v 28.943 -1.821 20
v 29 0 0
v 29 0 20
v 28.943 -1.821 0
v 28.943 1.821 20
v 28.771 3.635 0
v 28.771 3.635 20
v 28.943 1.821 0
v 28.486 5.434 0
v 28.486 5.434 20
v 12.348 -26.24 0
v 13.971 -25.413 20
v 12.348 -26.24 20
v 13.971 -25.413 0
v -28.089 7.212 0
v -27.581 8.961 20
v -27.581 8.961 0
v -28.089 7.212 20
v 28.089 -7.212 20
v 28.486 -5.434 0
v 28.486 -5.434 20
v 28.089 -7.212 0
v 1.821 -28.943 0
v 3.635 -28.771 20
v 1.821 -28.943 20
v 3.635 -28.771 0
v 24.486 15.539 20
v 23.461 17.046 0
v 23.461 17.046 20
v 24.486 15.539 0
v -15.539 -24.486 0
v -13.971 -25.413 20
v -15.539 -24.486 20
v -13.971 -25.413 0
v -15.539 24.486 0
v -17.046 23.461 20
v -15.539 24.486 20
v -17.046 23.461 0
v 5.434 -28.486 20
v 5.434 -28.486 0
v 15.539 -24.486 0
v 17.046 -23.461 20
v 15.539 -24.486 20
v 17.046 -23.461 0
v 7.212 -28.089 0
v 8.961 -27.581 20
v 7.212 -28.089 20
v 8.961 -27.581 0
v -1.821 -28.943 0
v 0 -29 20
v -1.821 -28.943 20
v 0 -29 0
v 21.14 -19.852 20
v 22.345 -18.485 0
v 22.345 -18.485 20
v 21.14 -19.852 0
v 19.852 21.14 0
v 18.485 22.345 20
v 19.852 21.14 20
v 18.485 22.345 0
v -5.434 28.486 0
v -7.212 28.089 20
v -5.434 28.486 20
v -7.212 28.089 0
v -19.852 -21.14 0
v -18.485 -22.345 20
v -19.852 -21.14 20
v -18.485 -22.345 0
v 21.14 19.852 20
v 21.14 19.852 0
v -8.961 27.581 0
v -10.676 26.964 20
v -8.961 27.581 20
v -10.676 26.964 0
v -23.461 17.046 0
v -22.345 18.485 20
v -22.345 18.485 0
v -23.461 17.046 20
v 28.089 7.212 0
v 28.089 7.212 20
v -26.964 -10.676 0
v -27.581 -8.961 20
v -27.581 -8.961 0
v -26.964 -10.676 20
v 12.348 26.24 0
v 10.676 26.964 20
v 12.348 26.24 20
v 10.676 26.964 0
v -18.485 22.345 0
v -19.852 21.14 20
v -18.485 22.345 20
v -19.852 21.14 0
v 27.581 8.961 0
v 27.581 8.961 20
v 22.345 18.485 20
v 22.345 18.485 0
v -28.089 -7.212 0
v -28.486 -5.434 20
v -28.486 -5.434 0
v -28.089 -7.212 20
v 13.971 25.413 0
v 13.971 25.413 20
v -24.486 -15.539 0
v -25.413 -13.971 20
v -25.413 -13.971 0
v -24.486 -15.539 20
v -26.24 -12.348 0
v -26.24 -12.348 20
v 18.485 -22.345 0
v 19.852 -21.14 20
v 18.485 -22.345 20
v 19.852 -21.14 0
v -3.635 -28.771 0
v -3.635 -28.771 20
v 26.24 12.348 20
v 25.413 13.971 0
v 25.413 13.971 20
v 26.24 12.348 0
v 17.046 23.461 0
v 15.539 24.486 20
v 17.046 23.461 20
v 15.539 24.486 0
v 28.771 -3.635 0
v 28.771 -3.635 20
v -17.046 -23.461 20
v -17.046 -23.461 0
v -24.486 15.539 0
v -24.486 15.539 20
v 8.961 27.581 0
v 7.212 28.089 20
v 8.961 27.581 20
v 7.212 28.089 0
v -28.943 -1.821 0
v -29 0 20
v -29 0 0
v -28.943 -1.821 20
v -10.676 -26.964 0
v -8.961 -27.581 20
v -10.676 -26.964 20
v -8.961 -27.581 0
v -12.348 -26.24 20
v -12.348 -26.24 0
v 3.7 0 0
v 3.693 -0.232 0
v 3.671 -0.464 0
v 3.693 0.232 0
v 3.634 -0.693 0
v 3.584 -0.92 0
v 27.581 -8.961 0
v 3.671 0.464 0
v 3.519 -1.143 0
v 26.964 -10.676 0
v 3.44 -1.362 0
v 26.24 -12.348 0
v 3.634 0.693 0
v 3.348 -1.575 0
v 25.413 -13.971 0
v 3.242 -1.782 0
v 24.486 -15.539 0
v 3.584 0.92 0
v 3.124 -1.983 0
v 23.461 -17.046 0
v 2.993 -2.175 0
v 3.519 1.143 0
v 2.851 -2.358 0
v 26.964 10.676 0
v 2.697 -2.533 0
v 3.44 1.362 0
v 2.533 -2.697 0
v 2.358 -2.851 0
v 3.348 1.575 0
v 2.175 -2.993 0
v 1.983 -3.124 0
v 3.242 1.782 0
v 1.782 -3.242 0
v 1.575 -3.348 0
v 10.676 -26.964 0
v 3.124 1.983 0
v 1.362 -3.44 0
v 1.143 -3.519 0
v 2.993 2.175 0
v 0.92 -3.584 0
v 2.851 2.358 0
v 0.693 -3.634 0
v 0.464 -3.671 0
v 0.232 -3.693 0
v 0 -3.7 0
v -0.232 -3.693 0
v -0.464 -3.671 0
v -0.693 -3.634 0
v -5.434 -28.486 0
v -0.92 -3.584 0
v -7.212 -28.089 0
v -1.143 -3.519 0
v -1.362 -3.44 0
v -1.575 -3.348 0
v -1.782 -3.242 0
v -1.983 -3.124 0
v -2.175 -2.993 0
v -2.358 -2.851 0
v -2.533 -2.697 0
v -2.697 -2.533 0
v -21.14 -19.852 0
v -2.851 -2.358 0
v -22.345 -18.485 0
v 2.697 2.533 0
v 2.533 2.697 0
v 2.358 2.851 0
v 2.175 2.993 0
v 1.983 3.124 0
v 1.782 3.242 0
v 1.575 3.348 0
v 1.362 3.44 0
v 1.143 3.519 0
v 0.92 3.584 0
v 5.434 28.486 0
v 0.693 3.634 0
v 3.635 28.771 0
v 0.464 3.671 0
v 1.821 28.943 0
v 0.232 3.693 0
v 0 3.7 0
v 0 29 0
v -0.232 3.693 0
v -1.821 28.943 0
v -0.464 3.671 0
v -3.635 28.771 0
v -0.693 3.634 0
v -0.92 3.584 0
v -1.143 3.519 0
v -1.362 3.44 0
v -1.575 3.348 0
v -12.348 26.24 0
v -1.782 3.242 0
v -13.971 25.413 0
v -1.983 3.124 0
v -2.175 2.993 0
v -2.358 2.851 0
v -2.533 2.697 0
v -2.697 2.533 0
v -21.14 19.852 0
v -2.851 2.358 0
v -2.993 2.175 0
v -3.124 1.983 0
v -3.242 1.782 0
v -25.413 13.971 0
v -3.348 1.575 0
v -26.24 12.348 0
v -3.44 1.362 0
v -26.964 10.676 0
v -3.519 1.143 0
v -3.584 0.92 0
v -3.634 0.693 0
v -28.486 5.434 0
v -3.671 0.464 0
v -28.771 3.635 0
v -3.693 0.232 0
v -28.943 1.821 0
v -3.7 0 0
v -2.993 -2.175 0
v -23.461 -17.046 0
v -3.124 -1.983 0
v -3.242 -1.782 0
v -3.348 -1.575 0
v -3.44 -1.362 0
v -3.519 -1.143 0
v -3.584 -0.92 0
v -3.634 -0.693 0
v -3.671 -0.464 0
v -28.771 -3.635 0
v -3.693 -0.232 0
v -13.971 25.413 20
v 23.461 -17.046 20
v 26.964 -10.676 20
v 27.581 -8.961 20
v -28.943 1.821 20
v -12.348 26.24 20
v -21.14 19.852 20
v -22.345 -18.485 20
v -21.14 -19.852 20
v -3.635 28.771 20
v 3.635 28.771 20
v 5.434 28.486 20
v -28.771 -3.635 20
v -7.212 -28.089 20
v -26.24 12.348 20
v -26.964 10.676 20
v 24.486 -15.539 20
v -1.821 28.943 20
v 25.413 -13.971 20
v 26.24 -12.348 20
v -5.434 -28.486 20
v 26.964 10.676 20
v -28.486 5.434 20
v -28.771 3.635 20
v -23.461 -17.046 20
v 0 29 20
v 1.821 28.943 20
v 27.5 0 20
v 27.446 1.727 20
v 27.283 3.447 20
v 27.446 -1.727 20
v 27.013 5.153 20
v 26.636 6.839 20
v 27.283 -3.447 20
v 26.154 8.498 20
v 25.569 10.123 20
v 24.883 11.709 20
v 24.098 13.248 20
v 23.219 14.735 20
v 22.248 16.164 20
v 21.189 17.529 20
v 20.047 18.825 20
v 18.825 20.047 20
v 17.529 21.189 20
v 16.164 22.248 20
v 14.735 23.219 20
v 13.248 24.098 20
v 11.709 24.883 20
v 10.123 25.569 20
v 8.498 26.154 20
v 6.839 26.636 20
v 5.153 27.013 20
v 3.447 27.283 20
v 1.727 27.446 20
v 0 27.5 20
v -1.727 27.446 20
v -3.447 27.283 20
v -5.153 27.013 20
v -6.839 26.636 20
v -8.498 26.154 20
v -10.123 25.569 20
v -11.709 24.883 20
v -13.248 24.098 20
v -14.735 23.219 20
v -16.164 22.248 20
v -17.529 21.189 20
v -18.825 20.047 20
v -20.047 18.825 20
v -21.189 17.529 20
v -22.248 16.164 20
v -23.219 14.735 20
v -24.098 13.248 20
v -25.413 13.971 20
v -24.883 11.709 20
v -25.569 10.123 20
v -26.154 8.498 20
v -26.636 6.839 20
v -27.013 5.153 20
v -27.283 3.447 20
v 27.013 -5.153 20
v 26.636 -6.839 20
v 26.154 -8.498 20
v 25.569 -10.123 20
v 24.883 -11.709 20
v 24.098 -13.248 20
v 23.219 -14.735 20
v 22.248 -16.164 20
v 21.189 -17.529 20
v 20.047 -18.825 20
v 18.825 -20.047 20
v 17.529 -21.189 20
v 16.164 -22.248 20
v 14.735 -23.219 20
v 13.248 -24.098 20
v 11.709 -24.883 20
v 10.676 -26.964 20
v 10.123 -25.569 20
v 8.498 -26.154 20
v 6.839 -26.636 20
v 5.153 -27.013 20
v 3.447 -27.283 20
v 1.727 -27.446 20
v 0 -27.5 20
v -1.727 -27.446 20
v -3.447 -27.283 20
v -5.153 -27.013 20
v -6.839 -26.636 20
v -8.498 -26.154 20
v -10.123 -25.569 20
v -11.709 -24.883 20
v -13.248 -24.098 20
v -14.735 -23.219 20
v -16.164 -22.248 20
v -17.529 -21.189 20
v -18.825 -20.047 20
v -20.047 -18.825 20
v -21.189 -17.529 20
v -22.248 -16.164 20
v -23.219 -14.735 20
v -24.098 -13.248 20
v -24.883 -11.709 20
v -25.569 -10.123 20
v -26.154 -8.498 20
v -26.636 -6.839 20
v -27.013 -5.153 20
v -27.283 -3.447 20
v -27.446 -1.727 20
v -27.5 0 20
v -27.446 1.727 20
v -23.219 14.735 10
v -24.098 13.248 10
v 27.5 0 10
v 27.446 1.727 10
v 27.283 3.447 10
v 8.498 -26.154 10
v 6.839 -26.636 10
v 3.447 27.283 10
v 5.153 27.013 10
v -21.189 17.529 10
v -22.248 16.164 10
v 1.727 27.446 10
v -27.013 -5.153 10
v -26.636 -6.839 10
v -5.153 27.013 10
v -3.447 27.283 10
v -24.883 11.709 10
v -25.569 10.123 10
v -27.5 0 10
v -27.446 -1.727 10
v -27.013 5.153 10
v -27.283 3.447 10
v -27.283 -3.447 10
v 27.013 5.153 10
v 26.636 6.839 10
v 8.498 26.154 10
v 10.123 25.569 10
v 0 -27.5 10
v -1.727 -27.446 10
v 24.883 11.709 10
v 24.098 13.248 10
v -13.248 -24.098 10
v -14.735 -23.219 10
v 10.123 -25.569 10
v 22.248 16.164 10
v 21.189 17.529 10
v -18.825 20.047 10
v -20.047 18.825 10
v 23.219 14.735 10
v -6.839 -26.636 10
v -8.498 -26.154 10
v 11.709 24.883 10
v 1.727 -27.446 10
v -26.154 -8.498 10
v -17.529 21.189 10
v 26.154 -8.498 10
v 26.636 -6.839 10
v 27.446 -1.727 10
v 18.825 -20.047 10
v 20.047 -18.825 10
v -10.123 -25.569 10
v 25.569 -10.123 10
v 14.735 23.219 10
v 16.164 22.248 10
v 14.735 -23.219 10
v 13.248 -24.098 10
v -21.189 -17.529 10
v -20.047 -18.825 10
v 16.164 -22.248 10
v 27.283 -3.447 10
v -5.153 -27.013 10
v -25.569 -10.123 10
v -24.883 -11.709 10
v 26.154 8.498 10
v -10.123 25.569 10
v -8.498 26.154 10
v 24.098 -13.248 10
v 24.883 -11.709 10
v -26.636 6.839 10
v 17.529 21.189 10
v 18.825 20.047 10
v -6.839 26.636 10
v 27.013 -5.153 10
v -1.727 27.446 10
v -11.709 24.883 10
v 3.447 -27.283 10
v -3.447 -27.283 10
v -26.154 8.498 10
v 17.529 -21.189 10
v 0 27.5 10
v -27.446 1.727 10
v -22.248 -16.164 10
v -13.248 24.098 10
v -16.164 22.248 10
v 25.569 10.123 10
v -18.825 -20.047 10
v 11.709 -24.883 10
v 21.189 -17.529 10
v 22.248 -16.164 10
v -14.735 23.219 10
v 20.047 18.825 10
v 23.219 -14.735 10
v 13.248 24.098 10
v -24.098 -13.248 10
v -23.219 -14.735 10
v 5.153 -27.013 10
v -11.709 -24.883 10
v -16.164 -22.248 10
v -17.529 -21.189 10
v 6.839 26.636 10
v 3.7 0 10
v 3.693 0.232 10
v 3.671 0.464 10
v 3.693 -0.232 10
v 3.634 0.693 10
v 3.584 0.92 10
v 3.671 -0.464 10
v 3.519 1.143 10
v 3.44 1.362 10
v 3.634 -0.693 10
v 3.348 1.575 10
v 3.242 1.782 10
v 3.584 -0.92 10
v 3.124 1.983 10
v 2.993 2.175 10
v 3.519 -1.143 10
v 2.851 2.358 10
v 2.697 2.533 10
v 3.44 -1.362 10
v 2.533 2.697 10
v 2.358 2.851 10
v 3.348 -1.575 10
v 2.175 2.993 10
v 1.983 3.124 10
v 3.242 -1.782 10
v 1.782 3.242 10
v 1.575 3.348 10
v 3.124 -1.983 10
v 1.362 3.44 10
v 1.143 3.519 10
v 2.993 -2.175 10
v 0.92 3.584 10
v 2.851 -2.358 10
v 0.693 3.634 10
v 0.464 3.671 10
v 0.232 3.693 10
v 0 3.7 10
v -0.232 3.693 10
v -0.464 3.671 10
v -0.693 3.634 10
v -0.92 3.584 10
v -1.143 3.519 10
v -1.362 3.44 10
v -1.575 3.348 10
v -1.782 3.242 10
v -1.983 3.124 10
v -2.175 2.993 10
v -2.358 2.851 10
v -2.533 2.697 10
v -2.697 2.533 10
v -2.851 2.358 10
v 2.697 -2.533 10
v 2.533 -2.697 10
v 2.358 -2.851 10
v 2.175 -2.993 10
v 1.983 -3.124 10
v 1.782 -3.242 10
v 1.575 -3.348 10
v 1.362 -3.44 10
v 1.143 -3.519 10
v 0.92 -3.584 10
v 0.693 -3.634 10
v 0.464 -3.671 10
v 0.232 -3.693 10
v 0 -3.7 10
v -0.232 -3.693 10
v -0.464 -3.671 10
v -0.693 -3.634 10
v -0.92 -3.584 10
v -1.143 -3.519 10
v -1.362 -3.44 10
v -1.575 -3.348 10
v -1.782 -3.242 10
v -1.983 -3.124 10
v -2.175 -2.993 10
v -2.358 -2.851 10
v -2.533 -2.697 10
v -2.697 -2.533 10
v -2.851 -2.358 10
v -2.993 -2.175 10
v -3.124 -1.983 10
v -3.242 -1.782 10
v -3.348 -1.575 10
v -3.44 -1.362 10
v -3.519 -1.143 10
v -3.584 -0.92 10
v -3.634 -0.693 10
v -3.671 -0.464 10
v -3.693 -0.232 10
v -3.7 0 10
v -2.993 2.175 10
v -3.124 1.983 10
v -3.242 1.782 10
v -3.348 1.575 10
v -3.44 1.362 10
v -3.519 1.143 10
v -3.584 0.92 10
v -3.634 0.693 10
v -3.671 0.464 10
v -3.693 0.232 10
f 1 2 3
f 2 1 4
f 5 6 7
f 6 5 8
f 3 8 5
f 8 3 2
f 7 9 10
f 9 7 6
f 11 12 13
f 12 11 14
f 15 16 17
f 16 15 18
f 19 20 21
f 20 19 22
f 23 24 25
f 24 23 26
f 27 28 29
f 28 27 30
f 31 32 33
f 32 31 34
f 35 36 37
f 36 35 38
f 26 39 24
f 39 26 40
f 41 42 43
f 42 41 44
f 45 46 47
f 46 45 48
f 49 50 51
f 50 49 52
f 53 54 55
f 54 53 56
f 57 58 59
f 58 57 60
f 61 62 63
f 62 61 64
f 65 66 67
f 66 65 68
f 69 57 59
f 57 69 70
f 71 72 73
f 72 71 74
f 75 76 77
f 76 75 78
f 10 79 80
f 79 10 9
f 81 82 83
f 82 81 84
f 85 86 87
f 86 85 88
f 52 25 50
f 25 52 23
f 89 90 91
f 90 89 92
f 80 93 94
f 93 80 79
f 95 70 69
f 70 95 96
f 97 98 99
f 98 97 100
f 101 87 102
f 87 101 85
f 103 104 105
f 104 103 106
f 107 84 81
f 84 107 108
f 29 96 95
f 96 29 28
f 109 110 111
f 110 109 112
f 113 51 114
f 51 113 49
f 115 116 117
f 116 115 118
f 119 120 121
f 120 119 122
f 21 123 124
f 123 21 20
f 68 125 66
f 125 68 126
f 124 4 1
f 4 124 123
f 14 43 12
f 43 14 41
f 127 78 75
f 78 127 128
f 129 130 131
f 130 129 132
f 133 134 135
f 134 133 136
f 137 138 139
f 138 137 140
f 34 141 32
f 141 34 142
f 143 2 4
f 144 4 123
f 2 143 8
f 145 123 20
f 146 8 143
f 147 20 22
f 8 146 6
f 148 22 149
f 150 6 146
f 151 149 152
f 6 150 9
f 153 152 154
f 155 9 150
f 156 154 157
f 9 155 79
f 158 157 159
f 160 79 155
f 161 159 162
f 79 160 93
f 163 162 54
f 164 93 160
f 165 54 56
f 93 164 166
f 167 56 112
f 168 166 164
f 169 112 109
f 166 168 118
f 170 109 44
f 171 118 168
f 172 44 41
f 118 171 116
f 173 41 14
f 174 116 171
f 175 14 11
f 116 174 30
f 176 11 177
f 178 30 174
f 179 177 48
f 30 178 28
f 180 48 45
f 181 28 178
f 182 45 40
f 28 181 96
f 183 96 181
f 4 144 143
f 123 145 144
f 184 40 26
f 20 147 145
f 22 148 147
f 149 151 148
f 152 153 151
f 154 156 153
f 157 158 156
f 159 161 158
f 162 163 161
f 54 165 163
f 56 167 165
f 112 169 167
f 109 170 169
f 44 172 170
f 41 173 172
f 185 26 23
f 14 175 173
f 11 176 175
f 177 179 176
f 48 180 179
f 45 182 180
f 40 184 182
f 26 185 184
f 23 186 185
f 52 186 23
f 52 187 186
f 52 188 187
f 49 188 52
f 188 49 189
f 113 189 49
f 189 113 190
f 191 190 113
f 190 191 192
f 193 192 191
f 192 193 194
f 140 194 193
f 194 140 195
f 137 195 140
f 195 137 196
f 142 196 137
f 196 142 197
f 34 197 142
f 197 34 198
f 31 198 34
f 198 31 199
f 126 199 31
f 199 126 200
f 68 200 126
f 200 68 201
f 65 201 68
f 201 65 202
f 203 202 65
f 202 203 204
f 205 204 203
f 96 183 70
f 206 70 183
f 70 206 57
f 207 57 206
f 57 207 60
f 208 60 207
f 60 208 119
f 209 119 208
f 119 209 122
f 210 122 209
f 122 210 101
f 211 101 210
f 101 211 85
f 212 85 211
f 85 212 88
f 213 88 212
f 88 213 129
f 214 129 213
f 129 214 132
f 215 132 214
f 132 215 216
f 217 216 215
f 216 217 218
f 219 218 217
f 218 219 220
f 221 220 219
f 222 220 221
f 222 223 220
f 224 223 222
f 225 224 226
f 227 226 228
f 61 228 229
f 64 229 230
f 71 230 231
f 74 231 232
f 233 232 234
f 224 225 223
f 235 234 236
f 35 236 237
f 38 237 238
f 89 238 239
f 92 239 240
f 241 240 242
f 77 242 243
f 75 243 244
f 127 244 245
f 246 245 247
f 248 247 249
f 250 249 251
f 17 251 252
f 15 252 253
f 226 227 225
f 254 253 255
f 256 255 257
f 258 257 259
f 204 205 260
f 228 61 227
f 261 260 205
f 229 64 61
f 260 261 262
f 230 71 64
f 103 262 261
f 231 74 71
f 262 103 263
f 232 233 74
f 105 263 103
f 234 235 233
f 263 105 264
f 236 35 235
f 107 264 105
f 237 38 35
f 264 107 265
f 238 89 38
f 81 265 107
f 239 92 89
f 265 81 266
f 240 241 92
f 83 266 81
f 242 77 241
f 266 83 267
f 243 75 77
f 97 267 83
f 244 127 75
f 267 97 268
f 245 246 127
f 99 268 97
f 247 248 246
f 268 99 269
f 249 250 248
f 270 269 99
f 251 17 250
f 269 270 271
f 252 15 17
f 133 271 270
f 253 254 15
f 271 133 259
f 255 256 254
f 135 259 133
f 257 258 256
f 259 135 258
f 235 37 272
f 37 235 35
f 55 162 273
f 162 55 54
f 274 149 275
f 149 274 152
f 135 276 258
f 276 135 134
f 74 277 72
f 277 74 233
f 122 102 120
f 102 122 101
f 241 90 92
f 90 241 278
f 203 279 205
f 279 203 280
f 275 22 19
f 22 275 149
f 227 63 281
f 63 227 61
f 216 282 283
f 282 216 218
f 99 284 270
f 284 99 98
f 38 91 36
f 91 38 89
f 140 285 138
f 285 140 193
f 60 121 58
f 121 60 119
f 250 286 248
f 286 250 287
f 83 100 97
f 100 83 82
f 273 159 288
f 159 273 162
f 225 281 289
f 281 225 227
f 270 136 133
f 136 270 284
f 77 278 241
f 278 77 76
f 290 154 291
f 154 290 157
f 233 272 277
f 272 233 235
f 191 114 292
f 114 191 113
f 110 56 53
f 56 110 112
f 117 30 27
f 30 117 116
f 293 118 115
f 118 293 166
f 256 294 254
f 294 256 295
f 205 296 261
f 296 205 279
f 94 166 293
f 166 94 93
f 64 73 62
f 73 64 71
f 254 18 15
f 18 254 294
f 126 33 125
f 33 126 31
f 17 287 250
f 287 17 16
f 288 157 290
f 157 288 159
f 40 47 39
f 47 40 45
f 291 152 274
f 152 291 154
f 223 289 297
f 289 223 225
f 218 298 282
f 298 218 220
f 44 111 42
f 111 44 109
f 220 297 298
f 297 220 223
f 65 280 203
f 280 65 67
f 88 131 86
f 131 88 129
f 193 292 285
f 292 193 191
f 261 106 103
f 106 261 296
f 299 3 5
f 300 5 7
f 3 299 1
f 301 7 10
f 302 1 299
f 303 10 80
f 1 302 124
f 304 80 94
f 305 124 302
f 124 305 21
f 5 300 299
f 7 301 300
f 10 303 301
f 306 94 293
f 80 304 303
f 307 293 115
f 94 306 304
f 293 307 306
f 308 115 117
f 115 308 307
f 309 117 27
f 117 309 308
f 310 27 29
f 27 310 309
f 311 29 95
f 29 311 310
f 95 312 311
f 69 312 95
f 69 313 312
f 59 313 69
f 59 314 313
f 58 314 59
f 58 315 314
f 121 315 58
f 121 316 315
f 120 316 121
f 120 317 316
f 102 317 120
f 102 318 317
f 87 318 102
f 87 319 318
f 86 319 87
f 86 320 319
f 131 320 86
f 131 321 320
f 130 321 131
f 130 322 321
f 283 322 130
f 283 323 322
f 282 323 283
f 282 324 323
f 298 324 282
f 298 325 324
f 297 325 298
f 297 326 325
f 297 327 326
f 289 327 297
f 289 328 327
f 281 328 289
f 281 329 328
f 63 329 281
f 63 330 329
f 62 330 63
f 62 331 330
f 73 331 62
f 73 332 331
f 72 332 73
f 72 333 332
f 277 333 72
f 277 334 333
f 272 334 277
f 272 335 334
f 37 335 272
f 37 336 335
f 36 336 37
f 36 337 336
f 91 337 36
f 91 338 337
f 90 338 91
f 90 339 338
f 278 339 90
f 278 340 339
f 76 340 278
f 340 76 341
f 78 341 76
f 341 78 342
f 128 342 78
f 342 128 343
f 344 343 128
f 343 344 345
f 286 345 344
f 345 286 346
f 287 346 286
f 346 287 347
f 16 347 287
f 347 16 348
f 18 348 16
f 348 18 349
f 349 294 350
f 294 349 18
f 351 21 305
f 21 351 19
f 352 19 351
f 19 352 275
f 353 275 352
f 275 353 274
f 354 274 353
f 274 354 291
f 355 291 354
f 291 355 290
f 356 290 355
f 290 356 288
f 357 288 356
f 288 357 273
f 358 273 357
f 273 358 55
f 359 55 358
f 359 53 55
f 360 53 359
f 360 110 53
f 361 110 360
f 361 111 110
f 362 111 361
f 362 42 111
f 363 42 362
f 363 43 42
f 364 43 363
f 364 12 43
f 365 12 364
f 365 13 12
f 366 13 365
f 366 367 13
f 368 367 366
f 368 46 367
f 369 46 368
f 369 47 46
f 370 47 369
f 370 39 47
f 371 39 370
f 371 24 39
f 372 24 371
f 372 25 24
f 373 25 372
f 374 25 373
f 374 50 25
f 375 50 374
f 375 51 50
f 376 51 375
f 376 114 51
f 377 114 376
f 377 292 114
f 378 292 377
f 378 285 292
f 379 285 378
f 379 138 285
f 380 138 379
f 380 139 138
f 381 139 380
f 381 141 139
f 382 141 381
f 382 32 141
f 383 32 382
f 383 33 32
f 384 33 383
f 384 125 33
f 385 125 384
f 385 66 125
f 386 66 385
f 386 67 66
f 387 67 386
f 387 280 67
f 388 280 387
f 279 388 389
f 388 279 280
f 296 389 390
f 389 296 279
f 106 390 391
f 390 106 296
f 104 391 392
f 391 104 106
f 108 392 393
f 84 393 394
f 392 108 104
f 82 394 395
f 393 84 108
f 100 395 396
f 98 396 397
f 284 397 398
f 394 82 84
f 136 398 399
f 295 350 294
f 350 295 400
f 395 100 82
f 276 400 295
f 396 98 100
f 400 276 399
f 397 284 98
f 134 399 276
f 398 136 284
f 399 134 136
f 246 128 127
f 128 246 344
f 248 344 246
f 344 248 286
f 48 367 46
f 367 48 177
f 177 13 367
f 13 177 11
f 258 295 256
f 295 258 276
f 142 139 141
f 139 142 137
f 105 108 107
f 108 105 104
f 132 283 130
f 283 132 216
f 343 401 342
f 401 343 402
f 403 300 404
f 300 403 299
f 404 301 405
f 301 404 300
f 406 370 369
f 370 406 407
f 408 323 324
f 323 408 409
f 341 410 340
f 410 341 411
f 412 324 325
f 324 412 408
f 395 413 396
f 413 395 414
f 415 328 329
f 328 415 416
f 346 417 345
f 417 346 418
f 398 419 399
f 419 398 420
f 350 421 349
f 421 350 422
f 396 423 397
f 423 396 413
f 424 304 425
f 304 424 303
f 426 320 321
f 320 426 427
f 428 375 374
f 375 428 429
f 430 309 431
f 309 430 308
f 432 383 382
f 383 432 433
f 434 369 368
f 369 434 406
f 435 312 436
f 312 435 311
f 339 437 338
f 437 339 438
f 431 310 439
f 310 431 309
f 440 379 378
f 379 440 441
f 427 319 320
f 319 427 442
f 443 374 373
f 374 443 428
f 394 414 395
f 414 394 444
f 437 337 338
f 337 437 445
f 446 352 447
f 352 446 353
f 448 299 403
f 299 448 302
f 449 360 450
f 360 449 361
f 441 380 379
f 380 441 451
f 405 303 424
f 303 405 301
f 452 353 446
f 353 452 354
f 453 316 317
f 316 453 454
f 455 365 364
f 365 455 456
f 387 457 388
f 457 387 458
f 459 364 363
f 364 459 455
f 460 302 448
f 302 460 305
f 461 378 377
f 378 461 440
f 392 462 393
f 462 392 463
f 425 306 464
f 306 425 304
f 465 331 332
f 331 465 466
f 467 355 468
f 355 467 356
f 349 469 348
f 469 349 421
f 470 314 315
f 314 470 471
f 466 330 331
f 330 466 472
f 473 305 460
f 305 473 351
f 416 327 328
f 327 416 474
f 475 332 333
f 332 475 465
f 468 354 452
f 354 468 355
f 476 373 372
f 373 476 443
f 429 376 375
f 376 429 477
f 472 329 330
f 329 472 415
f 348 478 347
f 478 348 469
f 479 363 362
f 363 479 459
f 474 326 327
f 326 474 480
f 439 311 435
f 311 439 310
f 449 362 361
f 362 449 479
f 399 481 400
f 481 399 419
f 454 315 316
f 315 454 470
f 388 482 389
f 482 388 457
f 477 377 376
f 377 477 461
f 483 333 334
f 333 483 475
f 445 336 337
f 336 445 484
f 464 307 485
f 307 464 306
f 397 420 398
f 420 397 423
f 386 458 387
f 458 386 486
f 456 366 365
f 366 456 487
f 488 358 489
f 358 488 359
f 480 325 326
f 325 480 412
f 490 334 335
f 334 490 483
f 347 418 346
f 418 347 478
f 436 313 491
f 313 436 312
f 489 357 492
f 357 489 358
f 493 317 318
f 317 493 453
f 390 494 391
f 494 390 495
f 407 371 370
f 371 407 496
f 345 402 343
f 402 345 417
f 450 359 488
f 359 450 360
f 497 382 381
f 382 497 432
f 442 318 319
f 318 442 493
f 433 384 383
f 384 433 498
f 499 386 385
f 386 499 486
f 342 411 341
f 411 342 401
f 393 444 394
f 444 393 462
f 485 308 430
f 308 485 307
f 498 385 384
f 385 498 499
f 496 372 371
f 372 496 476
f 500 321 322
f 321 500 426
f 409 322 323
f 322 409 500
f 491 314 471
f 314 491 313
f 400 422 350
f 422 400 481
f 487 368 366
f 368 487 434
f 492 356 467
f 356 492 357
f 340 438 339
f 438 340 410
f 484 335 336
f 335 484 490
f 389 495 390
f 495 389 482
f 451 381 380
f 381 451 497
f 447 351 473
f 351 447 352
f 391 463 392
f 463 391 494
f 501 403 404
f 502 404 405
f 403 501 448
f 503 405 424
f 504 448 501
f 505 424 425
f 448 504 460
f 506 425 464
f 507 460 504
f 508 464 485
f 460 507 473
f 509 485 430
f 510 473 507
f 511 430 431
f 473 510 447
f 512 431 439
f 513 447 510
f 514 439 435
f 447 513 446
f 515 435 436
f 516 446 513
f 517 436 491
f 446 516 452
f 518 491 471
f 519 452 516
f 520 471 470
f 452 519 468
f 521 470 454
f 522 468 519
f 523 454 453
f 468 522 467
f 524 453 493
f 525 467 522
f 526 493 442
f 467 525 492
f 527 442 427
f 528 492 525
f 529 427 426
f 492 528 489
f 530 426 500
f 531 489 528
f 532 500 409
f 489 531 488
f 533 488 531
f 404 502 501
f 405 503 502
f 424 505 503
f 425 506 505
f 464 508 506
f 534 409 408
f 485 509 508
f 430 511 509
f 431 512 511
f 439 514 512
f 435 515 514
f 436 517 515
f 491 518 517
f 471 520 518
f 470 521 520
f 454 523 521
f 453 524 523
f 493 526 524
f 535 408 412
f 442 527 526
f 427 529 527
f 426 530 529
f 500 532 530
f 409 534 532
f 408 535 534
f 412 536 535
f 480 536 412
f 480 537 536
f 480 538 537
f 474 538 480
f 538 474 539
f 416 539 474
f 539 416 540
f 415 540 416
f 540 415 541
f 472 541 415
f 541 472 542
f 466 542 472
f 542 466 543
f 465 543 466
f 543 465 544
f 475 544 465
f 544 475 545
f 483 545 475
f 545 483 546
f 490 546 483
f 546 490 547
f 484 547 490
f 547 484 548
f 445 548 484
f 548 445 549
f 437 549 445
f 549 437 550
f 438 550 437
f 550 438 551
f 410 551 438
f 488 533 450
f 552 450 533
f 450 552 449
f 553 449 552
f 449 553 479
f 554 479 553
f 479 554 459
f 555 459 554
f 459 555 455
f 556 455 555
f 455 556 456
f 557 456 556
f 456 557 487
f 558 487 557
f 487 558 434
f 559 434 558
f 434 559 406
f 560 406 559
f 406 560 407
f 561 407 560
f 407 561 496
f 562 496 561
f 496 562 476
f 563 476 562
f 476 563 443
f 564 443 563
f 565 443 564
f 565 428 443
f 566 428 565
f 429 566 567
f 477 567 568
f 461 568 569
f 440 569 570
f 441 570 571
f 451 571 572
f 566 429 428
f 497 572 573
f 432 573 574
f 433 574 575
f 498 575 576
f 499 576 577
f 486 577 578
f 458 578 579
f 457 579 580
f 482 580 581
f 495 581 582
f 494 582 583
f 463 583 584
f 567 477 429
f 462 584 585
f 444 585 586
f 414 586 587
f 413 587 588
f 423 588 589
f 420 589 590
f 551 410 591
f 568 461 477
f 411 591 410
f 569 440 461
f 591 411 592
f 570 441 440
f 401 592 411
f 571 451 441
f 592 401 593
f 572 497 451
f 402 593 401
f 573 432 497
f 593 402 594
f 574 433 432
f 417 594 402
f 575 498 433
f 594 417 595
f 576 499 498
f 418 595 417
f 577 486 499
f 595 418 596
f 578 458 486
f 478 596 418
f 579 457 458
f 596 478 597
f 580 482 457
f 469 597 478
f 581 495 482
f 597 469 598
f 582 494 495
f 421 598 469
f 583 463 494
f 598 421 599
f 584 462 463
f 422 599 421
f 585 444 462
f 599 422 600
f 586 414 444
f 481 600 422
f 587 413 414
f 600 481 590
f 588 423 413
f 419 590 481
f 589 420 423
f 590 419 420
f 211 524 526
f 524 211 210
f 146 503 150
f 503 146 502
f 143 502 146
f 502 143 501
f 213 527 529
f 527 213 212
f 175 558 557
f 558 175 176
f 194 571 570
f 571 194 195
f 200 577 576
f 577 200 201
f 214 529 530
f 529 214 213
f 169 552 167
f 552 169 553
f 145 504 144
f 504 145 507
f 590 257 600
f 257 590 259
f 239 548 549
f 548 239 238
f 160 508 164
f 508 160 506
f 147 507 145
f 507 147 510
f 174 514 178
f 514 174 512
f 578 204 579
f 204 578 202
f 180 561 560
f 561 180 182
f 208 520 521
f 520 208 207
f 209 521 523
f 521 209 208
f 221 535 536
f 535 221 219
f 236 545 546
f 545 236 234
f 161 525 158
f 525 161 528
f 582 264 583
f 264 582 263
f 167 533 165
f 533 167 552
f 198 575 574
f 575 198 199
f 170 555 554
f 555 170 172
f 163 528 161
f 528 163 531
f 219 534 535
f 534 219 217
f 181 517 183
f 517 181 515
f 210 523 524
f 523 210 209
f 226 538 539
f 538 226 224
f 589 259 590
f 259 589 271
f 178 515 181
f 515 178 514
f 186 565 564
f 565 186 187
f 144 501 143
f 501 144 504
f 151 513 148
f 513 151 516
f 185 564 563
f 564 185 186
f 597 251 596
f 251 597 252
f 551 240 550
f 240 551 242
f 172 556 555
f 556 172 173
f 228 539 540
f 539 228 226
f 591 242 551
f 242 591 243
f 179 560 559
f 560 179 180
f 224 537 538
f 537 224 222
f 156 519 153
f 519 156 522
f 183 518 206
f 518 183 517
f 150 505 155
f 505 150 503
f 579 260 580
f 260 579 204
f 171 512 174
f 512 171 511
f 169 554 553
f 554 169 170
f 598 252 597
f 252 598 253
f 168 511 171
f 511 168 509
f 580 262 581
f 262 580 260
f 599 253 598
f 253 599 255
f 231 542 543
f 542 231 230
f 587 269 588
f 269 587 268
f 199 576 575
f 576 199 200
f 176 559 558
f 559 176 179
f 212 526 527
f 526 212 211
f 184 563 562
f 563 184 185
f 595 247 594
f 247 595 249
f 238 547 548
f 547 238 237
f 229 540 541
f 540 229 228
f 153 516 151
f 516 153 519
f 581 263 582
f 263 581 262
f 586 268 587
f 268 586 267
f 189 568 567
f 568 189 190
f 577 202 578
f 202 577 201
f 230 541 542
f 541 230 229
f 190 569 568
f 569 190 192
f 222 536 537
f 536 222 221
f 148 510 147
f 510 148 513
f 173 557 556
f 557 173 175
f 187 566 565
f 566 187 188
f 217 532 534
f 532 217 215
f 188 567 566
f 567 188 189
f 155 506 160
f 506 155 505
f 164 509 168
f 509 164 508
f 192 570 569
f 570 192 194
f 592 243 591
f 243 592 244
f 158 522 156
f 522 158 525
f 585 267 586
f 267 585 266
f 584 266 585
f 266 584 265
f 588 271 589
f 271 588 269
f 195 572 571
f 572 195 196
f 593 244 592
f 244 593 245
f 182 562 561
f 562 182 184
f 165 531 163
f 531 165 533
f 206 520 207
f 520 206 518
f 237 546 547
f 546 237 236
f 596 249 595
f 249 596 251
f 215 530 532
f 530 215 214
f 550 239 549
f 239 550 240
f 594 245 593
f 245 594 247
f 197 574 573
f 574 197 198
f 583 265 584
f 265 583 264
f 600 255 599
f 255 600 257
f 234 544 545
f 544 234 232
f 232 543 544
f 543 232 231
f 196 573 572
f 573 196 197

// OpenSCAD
// 3 cylinders 
// center rod 7mm
// ouside: 55mm
$fn=100;
SMALL_DIAM = 7.4;
LARGE_DIAM = 55;

HEIGHT_1 = 10;
HEIGHT_2 = HEIGHT_1 + 10;

difference(){
    cylinder(h=HEIGHT_2,d=LARGE_DIAM+3);
    cylinder(h=HEIGHT_2,d=LARGE_DIAM);
}

difference(){    
    cylinder(h=HEIGHT_1,d=LARGE_DIAM);    
    cylinder(h=HEIGHT_1,d=SMALL_DIAM);
}
